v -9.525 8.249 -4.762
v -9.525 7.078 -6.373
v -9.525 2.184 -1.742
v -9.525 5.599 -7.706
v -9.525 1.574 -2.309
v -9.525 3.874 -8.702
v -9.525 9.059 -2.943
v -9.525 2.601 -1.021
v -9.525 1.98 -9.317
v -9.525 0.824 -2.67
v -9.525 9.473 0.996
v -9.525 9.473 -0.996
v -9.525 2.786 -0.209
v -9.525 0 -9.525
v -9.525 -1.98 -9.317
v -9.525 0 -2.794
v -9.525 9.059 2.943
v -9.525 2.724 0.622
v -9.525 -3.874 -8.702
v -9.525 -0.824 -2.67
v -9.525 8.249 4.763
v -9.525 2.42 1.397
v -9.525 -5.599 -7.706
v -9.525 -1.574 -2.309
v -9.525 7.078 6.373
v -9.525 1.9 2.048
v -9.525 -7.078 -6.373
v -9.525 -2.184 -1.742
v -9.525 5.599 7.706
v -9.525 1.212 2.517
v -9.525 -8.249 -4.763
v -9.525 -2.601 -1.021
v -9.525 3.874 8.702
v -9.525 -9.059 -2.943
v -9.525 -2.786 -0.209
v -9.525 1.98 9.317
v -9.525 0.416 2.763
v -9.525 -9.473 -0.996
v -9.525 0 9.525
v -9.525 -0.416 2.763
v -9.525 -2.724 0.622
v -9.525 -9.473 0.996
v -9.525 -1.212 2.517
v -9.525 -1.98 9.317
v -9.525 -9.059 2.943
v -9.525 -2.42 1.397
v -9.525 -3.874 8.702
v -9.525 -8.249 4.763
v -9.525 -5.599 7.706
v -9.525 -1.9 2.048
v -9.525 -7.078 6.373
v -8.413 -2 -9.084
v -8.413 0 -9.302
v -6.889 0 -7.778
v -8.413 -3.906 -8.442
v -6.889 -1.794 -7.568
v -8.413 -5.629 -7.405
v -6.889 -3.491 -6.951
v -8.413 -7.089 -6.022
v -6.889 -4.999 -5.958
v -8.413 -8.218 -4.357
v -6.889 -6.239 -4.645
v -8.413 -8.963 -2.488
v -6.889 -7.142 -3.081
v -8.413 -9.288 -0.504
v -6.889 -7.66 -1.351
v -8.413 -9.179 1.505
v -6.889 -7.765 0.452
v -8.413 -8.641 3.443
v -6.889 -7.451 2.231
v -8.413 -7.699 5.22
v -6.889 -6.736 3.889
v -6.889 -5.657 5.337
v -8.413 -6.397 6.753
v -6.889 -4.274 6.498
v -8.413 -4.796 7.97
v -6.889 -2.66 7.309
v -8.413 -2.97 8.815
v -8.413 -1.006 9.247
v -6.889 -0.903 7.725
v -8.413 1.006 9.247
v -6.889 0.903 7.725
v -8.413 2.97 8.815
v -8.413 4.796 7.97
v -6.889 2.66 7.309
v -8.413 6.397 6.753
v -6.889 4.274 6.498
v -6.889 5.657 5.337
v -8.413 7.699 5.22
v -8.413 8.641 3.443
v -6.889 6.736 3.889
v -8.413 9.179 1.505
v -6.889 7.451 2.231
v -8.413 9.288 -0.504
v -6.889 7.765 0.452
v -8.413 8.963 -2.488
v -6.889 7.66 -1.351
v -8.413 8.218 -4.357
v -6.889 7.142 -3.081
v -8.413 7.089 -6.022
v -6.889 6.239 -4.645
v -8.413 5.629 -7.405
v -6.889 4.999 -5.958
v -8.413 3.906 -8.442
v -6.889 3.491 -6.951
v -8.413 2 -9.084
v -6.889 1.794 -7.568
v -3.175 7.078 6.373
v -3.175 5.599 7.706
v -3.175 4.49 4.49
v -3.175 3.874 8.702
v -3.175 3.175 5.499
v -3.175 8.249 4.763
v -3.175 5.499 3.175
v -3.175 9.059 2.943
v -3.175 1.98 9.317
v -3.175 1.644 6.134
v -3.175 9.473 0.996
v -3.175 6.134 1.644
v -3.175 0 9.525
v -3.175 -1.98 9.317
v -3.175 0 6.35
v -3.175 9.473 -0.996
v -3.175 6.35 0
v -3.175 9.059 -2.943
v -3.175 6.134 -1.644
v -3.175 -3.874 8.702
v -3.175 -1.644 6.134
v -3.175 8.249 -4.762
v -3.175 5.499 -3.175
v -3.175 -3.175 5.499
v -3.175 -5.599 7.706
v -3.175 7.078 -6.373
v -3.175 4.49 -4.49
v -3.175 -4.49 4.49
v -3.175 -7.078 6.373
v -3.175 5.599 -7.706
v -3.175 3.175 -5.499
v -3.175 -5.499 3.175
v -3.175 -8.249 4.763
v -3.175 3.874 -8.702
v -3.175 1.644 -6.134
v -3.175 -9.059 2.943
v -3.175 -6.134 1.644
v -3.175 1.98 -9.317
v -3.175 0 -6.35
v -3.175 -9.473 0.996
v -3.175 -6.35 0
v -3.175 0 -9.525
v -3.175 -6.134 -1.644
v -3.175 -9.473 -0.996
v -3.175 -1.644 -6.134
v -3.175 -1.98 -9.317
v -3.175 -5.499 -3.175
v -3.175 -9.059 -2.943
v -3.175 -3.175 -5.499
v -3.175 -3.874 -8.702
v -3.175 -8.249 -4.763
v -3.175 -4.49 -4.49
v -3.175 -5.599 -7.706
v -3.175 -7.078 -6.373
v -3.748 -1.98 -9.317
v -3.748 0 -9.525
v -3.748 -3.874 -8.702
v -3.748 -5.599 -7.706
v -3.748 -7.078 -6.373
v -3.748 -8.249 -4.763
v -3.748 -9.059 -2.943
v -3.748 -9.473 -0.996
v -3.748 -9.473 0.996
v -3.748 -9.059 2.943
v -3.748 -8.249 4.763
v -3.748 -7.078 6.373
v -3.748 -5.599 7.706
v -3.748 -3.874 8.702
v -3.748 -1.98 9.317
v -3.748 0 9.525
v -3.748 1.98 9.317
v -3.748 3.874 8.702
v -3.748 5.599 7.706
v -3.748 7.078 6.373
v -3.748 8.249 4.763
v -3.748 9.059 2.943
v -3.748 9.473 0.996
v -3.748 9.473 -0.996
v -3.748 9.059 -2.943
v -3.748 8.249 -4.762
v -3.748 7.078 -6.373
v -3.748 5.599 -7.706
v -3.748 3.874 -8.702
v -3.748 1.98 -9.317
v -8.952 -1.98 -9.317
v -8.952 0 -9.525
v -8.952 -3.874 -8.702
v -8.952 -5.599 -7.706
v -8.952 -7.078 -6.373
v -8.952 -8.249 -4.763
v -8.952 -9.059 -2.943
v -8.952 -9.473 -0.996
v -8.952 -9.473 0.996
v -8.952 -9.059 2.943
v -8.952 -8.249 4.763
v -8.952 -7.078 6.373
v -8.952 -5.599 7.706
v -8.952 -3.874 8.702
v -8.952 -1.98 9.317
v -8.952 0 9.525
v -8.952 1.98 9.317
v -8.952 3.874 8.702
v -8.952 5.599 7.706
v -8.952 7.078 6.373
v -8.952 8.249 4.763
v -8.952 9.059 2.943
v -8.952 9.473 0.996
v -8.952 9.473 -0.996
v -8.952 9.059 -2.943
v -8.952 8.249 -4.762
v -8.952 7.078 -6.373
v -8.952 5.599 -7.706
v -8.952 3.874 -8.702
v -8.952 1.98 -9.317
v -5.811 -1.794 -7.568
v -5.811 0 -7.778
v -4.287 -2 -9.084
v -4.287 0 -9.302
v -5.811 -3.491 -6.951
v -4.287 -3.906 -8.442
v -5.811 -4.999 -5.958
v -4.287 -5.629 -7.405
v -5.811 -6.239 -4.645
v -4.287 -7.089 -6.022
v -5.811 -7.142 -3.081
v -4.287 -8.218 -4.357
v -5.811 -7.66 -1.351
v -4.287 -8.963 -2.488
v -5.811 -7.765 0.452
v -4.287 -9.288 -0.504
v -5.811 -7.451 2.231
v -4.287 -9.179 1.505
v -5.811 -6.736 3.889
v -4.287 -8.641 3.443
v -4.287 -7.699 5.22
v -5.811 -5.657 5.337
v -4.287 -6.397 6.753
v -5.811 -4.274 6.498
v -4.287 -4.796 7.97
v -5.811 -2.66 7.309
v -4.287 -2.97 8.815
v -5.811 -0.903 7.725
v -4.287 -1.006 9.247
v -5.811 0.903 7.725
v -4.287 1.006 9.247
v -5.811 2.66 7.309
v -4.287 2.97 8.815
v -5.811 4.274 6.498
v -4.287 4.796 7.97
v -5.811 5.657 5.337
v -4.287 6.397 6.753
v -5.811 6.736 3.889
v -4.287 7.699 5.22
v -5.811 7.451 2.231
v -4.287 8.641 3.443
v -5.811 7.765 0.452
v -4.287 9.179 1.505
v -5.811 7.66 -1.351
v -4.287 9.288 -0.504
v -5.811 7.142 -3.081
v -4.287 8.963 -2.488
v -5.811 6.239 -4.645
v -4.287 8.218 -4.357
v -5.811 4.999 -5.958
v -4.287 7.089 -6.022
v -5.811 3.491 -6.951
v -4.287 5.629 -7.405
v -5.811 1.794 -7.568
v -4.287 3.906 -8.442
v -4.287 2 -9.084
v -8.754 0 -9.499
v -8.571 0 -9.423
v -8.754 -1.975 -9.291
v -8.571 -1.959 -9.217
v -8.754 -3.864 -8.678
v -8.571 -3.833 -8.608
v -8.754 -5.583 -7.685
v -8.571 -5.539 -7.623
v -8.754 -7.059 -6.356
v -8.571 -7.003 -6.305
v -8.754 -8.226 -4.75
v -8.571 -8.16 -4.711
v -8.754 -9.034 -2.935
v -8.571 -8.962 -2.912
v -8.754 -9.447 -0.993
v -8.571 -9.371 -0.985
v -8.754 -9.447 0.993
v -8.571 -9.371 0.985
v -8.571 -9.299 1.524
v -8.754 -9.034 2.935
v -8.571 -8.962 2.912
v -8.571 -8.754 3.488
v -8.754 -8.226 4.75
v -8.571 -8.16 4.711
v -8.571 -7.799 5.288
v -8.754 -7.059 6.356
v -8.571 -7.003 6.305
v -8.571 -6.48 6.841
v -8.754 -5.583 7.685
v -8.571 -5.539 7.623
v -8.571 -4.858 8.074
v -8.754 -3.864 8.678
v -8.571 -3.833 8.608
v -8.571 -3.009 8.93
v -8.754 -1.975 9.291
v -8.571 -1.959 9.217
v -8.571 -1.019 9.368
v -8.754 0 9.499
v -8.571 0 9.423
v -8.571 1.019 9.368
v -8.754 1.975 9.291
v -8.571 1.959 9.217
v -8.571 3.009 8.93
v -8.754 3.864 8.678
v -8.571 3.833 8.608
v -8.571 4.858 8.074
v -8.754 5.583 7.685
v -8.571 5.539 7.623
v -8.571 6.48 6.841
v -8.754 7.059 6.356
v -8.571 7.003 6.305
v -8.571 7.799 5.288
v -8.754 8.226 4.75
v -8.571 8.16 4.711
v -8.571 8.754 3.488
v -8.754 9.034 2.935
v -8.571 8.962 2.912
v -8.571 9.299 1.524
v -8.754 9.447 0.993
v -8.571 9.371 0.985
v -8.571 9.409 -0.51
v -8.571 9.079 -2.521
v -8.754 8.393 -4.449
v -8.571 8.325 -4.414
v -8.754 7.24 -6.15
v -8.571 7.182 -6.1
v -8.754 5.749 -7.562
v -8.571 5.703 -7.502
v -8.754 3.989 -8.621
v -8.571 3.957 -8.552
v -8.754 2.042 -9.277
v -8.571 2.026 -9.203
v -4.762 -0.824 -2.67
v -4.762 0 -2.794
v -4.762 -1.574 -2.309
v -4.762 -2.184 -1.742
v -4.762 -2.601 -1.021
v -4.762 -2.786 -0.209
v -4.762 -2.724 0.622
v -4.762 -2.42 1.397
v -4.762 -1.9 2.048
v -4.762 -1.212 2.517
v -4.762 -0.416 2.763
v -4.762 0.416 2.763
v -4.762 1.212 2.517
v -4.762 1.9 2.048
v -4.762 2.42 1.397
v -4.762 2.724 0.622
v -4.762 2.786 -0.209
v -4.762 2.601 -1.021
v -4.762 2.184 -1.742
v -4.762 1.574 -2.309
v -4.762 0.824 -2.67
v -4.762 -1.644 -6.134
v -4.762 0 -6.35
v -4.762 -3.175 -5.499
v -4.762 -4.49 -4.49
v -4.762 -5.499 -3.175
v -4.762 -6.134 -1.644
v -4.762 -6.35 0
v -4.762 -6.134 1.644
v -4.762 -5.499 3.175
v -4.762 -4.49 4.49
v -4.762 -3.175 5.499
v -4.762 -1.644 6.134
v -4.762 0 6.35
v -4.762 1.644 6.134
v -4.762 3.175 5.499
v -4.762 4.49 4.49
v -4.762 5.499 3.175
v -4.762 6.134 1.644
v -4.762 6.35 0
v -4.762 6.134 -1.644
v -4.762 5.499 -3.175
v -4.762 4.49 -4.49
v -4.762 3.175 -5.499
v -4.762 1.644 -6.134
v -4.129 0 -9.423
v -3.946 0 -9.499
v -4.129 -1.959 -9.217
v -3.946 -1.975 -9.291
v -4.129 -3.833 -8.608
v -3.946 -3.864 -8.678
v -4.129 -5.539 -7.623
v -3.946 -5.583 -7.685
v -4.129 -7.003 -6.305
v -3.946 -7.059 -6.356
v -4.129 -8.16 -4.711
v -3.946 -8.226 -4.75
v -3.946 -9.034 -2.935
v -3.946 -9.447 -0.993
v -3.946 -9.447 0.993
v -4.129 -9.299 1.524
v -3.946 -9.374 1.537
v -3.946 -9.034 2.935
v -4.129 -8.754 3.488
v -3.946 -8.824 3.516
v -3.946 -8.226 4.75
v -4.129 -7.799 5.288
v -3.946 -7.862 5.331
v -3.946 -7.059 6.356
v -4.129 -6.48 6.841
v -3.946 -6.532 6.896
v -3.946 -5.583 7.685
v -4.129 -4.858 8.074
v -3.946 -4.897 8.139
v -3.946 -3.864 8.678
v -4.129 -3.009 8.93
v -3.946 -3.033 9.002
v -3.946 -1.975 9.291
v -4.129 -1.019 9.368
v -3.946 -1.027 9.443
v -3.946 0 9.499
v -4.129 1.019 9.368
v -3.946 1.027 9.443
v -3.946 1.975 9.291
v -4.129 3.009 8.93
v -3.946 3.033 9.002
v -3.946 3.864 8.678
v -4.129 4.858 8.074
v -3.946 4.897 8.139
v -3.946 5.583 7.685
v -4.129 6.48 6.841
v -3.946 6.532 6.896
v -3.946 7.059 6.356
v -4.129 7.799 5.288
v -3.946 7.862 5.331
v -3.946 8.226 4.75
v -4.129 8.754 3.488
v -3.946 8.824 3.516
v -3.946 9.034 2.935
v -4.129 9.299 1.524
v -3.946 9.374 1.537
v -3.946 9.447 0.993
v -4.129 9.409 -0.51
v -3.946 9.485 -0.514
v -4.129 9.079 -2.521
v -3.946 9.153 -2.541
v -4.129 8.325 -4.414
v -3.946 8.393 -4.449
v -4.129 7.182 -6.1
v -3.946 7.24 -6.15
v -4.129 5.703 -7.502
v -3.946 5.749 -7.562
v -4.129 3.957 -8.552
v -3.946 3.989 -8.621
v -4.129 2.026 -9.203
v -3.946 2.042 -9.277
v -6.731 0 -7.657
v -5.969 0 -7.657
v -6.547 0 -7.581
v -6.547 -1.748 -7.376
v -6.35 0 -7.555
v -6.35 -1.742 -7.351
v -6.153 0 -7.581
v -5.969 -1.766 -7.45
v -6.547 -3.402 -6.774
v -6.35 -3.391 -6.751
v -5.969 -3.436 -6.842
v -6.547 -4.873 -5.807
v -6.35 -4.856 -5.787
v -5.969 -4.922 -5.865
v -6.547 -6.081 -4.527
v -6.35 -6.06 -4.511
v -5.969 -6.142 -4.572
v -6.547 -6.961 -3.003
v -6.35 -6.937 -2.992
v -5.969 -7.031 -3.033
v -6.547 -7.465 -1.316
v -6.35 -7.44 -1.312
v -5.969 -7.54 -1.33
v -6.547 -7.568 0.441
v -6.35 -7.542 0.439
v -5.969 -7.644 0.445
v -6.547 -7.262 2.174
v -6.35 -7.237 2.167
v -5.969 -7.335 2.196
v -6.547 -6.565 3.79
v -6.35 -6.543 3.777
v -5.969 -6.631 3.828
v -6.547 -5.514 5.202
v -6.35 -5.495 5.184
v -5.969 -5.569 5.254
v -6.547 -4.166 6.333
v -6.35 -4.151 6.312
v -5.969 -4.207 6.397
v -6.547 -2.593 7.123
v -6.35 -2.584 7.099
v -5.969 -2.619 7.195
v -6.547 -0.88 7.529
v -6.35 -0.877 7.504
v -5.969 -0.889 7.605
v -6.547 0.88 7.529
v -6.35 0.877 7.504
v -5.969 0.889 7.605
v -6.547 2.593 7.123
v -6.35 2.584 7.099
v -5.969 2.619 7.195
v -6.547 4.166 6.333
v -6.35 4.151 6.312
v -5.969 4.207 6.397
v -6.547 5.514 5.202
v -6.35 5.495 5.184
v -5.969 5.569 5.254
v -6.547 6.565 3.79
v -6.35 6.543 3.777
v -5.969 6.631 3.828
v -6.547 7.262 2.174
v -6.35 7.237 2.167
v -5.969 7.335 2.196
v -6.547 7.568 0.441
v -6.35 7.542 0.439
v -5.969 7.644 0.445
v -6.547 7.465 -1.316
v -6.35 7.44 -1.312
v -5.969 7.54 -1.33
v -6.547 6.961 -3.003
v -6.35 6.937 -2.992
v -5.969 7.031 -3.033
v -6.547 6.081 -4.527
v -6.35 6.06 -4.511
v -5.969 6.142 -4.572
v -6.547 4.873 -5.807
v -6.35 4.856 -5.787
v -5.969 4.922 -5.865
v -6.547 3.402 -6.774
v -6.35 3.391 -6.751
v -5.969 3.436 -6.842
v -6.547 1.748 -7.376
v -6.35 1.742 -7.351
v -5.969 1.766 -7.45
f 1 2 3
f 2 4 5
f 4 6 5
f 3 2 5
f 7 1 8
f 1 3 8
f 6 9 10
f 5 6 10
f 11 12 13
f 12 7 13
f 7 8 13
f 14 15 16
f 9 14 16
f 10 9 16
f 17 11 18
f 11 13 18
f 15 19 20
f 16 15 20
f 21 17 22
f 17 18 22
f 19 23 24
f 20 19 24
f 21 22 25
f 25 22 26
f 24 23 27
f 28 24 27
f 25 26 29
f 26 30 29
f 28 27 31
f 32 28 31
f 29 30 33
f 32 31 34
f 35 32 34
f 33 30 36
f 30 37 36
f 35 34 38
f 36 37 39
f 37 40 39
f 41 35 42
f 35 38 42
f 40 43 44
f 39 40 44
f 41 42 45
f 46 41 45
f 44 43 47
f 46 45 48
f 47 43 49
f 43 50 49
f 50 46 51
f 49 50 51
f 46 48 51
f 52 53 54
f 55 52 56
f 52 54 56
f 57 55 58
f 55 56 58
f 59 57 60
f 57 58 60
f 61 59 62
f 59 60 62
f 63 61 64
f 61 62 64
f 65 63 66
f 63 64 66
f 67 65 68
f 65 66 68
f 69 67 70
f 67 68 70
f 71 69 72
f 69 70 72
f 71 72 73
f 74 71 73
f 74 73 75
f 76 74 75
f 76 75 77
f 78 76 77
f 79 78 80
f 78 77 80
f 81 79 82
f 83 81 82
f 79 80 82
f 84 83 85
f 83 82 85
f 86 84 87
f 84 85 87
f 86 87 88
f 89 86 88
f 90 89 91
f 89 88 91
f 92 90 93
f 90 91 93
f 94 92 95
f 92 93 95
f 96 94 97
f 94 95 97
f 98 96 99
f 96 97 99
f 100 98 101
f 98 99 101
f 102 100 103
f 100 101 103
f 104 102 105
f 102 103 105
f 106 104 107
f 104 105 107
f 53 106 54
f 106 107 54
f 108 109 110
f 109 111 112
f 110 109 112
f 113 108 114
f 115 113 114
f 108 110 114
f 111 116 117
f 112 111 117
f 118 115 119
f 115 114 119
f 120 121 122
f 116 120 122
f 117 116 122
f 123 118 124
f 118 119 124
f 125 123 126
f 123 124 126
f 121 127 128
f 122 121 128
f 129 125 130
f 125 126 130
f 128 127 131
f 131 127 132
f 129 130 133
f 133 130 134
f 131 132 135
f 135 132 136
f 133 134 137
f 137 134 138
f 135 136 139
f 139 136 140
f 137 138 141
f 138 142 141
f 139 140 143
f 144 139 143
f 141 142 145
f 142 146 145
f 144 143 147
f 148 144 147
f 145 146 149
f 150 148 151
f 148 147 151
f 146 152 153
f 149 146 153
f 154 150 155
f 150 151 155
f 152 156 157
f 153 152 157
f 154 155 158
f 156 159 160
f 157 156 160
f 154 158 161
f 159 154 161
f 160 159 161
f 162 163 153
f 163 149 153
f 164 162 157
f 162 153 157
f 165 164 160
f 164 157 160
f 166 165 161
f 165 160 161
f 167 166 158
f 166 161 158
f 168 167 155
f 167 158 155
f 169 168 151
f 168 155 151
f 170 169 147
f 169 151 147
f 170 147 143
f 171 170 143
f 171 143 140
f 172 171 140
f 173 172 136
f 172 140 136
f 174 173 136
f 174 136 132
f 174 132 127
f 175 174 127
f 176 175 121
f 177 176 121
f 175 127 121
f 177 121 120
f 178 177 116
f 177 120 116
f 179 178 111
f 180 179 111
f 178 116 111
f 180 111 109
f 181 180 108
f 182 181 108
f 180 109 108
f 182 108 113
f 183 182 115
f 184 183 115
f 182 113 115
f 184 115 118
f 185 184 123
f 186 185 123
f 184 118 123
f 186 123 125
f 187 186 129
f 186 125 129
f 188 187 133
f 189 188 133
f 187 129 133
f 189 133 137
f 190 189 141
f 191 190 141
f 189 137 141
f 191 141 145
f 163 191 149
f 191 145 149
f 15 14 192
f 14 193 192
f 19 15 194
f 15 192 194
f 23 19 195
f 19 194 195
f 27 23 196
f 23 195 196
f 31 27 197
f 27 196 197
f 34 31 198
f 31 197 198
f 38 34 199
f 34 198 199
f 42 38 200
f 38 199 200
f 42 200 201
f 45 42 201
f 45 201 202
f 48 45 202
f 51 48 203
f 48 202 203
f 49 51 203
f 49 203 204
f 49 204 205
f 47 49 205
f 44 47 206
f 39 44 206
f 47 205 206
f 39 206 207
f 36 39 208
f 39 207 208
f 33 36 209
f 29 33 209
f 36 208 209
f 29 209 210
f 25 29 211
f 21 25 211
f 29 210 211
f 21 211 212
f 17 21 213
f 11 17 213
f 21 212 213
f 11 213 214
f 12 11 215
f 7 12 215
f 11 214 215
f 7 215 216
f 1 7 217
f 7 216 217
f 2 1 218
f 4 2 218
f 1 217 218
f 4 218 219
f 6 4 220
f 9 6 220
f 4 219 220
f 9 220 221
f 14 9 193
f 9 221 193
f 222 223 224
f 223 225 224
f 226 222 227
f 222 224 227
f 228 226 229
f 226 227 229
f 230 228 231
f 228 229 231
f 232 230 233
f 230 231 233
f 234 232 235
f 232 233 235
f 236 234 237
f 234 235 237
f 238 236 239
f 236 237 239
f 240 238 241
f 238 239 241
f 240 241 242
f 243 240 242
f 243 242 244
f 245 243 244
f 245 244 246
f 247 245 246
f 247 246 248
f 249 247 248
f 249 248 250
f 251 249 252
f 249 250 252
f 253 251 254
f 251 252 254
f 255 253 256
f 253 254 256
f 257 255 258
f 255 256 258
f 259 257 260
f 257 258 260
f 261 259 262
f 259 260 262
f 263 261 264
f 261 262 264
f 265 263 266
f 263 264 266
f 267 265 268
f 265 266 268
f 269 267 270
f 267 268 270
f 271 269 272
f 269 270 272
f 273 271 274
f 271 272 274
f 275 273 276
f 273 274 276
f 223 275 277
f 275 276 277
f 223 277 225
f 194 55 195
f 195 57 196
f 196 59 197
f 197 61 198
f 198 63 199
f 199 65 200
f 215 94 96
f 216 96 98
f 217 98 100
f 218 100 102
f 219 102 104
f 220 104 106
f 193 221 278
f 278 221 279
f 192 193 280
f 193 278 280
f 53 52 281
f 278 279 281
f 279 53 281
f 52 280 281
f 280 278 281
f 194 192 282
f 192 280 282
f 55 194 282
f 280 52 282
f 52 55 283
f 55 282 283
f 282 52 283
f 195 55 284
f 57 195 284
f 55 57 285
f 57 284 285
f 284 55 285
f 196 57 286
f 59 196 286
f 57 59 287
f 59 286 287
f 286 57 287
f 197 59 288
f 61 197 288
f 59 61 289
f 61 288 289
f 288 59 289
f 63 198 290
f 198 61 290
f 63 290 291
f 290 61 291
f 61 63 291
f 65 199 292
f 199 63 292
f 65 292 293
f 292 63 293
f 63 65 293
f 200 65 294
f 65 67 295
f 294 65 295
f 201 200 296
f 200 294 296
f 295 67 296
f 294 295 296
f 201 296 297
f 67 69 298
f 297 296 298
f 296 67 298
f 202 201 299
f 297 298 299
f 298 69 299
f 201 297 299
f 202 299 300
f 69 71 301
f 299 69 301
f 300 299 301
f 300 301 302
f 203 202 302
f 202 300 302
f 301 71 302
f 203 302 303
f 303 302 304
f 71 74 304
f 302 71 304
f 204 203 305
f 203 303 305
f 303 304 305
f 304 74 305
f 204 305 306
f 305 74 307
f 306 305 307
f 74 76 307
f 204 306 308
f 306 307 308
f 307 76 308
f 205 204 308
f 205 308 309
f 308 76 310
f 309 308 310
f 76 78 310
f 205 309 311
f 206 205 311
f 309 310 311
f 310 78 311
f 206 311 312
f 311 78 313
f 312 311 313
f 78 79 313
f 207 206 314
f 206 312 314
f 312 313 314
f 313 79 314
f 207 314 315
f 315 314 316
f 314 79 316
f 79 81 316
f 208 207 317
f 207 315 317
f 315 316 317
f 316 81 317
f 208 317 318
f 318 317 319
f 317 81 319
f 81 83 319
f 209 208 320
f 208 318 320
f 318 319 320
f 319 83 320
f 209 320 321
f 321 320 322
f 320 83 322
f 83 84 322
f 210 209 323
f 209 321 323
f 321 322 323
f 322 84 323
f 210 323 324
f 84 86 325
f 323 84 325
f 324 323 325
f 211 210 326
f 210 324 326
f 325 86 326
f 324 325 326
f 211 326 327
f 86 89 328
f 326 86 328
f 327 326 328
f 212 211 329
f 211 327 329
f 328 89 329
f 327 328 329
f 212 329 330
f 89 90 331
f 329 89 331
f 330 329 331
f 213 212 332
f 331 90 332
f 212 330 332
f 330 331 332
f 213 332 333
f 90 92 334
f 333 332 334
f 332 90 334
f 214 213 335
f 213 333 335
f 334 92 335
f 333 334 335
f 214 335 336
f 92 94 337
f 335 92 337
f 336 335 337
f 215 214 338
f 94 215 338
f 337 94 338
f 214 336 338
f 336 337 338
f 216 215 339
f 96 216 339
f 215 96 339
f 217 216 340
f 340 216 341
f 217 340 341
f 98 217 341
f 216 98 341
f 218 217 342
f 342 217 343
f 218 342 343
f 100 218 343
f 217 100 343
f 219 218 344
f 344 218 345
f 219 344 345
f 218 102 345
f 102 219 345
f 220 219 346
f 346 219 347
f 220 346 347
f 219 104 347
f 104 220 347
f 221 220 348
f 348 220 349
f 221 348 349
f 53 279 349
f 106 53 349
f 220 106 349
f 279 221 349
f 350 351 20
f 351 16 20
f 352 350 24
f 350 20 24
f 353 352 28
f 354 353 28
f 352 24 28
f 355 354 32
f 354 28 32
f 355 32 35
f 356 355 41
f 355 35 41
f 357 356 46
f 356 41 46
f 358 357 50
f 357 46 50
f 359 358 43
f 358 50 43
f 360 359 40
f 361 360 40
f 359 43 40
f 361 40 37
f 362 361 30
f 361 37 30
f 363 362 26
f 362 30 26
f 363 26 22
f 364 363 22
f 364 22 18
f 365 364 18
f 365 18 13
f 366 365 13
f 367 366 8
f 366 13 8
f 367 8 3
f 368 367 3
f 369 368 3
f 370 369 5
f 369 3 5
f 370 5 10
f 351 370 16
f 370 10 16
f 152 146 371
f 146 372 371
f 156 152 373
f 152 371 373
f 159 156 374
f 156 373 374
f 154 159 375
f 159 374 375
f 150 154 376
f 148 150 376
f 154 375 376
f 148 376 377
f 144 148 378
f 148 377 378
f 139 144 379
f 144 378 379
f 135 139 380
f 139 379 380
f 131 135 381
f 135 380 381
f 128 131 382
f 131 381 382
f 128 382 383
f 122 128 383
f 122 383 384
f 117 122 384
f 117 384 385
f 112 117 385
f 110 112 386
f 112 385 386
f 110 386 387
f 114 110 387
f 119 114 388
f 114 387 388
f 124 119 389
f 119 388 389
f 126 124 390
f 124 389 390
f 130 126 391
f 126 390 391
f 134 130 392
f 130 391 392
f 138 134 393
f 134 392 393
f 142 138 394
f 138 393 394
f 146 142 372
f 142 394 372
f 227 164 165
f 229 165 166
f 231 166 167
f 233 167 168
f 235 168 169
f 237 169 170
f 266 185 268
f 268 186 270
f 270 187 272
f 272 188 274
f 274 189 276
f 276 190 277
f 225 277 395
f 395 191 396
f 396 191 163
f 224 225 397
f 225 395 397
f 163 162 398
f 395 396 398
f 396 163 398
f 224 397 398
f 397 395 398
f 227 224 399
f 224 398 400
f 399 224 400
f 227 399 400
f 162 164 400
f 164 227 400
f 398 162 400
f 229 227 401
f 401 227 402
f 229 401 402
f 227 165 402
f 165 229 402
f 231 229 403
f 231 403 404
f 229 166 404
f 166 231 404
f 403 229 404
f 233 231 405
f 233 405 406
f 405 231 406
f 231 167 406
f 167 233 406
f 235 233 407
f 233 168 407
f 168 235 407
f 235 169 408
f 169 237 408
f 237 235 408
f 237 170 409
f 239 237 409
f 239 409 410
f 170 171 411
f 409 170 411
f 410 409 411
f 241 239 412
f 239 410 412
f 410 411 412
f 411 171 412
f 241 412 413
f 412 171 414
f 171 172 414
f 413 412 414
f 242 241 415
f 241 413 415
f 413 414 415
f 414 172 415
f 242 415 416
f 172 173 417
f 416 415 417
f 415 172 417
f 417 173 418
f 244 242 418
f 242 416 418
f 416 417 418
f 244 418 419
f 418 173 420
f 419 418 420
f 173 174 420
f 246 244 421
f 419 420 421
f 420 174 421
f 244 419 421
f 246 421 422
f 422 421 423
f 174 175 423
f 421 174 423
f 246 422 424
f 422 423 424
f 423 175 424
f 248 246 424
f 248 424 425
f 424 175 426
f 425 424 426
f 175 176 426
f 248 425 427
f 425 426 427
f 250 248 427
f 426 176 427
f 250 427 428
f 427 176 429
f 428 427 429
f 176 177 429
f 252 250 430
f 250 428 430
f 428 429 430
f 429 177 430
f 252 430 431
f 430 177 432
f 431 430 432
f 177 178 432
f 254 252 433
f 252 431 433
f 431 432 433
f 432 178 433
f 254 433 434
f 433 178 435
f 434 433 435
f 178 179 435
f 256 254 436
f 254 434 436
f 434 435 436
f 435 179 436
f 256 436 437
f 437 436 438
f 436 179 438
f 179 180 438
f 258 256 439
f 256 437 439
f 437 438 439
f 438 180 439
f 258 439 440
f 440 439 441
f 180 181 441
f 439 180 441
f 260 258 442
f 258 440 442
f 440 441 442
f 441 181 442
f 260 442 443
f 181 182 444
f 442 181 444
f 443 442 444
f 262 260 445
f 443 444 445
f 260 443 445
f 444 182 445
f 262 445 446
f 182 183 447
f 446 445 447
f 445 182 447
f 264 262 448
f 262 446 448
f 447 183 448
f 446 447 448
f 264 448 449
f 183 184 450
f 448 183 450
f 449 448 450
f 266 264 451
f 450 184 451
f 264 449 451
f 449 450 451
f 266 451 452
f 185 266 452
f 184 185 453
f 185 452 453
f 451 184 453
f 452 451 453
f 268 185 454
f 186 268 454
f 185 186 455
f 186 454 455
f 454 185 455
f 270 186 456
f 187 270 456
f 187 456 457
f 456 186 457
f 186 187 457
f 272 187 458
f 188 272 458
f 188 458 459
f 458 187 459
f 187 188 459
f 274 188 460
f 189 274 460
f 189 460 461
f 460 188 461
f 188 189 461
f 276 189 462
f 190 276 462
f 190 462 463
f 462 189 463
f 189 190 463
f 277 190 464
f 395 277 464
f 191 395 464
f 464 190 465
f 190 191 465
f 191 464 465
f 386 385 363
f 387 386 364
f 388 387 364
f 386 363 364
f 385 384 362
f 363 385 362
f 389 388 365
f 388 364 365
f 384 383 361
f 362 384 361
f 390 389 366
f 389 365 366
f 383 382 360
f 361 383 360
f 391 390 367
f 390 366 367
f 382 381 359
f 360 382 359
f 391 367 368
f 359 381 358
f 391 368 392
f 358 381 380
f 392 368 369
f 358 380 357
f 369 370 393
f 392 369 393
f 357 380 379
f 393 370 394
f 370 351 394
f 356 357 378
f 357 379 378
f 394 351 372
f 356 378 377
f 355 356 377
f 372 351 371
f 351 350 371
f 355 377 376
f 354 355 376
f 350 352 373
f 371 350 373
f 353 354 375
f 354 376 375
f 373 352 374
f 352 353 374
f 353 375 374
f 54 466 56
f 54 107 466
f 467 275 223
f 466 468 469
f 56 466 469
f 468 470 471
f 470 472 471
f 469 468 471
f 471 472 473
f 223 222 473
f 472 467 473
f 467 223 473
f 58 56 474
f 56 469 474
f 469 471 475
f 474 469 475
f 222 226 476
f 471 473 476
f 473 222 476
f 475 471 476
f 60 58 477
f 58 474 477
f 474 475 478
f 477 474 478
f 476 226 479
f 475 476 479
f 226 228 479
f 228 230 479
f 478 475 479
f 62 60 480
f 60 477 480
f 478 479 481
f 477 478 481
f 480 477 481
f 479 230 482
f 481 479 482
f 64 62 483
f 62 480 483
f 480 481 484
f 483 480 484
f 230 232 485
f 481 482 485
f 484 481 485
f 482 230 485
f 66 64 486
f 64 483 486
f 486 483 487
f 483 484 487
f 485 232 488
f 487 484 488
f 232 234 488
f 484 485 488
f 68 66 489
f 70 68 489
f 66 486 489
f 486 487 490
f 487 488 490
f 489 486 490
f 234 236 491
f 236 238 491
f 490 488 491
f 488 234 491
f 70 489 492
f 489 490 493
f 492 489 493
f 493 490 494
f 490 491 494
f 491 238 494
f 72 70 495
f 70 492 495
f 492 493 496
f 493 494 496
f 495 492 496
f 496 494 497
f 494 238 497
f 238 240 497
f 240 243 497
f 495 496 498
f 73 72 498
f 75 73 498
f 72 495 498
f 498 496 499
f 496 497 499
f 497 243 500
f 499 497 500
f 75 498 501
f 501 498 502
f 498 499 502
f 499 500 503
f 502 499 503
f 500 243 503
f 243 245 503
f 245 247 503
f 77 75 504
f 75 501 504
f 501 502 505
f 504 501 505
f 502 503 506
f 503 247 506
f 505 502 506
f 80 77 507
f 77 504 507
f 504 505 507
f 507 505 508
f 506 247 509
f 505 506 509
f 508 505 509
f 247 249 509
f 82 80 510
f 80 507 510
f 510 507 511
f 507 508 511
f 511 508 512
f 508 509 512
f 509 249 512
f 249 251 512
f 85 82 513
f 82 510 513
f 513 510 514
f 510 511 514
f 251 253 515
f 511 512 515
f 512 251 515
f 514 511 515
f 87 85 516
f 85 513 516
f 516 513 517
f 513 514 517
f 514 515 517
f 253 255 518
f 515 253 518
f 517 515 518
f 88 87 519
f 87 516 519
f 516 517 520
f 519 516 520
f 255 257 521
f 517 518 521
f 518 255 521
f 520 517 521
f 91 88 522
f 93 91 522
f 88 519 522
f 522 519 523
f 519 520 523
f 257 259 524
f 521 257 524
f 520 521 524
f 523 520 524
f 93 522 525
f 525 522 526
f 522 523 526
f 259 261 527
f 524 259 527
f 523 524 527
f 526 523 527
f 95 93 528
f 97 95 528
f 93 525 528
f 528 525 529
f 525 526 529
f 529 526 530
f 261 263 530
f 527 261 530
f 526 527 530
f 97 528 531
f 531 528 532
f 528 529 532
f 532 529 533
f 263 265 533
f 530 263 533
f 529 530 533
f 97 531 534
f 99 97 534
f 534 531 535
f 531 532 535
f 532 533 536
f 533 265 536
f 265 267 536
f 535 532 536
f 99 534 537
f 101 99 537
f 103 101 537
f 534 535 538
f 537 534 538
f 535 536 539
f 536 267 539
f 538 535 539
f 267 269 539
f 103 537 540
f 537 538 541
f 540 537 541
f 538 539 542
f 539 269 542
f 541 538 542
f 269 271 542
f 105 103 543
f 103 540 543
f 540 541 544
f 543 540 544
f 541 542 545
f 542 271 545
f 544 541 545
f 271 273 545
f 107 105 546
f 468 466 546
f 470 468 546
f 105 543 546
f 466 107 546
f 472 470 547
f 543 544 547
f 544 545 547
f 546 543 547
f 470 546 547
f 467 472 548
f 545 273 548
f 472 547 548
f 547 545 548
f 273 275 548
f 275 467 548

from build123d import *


with BuildPart() as part:
    # Sketch1 → Revolve1 (revolve)
    with BuildSketch(Plane.XY, mode=Mode.PRIVATE) as revolve1_sk:
        with BuildLine():
            Line((-3.175, 6.35), (-4.7625, 6.35))
            Line((-4.7625, 6.35), (-4.7625, 2.794))
            Line((-4.7625, 2.794), (-9.525, 2.794))
            Line((-9.525, 2.794), (-9.525, 9.525))
            Line((-9.525, 9.525), (-8.951630735, 9.525))
            ThreePointArc((-8.951630735, 9.525), (-8.660025959, 9.466996204), (-8.412815367, 9.301815367))
            Line((-8.412815367, 9.301815367), (-6.888815367, 7.777815367))
            ThreePointArc((-6.888815367, 7.777815367), (-6.35, 7.554630735), (-5.811184633, 7.777815367))
            Line((-5.811184633, 7.777815367), (-4.287184633, 9.301815367))
            ThreePointArc((-4.287184633, 9.301815367), (-4.039974041, 9.466996204), (-3.748369265, 9.525))
            Line((-3.748369265, 9.525), (-3.175, 9.525))
            Line((-3.175, 9.525), (-3.175, 6.35))
        make_face()
    revolve(revolve1_sk.sketch.rotate(Axis((0, 0, 0), (-1, 0, 0)), 90), axis=Axis((0, 0, 0), (-1, 0, 0)))


solid = part.part
